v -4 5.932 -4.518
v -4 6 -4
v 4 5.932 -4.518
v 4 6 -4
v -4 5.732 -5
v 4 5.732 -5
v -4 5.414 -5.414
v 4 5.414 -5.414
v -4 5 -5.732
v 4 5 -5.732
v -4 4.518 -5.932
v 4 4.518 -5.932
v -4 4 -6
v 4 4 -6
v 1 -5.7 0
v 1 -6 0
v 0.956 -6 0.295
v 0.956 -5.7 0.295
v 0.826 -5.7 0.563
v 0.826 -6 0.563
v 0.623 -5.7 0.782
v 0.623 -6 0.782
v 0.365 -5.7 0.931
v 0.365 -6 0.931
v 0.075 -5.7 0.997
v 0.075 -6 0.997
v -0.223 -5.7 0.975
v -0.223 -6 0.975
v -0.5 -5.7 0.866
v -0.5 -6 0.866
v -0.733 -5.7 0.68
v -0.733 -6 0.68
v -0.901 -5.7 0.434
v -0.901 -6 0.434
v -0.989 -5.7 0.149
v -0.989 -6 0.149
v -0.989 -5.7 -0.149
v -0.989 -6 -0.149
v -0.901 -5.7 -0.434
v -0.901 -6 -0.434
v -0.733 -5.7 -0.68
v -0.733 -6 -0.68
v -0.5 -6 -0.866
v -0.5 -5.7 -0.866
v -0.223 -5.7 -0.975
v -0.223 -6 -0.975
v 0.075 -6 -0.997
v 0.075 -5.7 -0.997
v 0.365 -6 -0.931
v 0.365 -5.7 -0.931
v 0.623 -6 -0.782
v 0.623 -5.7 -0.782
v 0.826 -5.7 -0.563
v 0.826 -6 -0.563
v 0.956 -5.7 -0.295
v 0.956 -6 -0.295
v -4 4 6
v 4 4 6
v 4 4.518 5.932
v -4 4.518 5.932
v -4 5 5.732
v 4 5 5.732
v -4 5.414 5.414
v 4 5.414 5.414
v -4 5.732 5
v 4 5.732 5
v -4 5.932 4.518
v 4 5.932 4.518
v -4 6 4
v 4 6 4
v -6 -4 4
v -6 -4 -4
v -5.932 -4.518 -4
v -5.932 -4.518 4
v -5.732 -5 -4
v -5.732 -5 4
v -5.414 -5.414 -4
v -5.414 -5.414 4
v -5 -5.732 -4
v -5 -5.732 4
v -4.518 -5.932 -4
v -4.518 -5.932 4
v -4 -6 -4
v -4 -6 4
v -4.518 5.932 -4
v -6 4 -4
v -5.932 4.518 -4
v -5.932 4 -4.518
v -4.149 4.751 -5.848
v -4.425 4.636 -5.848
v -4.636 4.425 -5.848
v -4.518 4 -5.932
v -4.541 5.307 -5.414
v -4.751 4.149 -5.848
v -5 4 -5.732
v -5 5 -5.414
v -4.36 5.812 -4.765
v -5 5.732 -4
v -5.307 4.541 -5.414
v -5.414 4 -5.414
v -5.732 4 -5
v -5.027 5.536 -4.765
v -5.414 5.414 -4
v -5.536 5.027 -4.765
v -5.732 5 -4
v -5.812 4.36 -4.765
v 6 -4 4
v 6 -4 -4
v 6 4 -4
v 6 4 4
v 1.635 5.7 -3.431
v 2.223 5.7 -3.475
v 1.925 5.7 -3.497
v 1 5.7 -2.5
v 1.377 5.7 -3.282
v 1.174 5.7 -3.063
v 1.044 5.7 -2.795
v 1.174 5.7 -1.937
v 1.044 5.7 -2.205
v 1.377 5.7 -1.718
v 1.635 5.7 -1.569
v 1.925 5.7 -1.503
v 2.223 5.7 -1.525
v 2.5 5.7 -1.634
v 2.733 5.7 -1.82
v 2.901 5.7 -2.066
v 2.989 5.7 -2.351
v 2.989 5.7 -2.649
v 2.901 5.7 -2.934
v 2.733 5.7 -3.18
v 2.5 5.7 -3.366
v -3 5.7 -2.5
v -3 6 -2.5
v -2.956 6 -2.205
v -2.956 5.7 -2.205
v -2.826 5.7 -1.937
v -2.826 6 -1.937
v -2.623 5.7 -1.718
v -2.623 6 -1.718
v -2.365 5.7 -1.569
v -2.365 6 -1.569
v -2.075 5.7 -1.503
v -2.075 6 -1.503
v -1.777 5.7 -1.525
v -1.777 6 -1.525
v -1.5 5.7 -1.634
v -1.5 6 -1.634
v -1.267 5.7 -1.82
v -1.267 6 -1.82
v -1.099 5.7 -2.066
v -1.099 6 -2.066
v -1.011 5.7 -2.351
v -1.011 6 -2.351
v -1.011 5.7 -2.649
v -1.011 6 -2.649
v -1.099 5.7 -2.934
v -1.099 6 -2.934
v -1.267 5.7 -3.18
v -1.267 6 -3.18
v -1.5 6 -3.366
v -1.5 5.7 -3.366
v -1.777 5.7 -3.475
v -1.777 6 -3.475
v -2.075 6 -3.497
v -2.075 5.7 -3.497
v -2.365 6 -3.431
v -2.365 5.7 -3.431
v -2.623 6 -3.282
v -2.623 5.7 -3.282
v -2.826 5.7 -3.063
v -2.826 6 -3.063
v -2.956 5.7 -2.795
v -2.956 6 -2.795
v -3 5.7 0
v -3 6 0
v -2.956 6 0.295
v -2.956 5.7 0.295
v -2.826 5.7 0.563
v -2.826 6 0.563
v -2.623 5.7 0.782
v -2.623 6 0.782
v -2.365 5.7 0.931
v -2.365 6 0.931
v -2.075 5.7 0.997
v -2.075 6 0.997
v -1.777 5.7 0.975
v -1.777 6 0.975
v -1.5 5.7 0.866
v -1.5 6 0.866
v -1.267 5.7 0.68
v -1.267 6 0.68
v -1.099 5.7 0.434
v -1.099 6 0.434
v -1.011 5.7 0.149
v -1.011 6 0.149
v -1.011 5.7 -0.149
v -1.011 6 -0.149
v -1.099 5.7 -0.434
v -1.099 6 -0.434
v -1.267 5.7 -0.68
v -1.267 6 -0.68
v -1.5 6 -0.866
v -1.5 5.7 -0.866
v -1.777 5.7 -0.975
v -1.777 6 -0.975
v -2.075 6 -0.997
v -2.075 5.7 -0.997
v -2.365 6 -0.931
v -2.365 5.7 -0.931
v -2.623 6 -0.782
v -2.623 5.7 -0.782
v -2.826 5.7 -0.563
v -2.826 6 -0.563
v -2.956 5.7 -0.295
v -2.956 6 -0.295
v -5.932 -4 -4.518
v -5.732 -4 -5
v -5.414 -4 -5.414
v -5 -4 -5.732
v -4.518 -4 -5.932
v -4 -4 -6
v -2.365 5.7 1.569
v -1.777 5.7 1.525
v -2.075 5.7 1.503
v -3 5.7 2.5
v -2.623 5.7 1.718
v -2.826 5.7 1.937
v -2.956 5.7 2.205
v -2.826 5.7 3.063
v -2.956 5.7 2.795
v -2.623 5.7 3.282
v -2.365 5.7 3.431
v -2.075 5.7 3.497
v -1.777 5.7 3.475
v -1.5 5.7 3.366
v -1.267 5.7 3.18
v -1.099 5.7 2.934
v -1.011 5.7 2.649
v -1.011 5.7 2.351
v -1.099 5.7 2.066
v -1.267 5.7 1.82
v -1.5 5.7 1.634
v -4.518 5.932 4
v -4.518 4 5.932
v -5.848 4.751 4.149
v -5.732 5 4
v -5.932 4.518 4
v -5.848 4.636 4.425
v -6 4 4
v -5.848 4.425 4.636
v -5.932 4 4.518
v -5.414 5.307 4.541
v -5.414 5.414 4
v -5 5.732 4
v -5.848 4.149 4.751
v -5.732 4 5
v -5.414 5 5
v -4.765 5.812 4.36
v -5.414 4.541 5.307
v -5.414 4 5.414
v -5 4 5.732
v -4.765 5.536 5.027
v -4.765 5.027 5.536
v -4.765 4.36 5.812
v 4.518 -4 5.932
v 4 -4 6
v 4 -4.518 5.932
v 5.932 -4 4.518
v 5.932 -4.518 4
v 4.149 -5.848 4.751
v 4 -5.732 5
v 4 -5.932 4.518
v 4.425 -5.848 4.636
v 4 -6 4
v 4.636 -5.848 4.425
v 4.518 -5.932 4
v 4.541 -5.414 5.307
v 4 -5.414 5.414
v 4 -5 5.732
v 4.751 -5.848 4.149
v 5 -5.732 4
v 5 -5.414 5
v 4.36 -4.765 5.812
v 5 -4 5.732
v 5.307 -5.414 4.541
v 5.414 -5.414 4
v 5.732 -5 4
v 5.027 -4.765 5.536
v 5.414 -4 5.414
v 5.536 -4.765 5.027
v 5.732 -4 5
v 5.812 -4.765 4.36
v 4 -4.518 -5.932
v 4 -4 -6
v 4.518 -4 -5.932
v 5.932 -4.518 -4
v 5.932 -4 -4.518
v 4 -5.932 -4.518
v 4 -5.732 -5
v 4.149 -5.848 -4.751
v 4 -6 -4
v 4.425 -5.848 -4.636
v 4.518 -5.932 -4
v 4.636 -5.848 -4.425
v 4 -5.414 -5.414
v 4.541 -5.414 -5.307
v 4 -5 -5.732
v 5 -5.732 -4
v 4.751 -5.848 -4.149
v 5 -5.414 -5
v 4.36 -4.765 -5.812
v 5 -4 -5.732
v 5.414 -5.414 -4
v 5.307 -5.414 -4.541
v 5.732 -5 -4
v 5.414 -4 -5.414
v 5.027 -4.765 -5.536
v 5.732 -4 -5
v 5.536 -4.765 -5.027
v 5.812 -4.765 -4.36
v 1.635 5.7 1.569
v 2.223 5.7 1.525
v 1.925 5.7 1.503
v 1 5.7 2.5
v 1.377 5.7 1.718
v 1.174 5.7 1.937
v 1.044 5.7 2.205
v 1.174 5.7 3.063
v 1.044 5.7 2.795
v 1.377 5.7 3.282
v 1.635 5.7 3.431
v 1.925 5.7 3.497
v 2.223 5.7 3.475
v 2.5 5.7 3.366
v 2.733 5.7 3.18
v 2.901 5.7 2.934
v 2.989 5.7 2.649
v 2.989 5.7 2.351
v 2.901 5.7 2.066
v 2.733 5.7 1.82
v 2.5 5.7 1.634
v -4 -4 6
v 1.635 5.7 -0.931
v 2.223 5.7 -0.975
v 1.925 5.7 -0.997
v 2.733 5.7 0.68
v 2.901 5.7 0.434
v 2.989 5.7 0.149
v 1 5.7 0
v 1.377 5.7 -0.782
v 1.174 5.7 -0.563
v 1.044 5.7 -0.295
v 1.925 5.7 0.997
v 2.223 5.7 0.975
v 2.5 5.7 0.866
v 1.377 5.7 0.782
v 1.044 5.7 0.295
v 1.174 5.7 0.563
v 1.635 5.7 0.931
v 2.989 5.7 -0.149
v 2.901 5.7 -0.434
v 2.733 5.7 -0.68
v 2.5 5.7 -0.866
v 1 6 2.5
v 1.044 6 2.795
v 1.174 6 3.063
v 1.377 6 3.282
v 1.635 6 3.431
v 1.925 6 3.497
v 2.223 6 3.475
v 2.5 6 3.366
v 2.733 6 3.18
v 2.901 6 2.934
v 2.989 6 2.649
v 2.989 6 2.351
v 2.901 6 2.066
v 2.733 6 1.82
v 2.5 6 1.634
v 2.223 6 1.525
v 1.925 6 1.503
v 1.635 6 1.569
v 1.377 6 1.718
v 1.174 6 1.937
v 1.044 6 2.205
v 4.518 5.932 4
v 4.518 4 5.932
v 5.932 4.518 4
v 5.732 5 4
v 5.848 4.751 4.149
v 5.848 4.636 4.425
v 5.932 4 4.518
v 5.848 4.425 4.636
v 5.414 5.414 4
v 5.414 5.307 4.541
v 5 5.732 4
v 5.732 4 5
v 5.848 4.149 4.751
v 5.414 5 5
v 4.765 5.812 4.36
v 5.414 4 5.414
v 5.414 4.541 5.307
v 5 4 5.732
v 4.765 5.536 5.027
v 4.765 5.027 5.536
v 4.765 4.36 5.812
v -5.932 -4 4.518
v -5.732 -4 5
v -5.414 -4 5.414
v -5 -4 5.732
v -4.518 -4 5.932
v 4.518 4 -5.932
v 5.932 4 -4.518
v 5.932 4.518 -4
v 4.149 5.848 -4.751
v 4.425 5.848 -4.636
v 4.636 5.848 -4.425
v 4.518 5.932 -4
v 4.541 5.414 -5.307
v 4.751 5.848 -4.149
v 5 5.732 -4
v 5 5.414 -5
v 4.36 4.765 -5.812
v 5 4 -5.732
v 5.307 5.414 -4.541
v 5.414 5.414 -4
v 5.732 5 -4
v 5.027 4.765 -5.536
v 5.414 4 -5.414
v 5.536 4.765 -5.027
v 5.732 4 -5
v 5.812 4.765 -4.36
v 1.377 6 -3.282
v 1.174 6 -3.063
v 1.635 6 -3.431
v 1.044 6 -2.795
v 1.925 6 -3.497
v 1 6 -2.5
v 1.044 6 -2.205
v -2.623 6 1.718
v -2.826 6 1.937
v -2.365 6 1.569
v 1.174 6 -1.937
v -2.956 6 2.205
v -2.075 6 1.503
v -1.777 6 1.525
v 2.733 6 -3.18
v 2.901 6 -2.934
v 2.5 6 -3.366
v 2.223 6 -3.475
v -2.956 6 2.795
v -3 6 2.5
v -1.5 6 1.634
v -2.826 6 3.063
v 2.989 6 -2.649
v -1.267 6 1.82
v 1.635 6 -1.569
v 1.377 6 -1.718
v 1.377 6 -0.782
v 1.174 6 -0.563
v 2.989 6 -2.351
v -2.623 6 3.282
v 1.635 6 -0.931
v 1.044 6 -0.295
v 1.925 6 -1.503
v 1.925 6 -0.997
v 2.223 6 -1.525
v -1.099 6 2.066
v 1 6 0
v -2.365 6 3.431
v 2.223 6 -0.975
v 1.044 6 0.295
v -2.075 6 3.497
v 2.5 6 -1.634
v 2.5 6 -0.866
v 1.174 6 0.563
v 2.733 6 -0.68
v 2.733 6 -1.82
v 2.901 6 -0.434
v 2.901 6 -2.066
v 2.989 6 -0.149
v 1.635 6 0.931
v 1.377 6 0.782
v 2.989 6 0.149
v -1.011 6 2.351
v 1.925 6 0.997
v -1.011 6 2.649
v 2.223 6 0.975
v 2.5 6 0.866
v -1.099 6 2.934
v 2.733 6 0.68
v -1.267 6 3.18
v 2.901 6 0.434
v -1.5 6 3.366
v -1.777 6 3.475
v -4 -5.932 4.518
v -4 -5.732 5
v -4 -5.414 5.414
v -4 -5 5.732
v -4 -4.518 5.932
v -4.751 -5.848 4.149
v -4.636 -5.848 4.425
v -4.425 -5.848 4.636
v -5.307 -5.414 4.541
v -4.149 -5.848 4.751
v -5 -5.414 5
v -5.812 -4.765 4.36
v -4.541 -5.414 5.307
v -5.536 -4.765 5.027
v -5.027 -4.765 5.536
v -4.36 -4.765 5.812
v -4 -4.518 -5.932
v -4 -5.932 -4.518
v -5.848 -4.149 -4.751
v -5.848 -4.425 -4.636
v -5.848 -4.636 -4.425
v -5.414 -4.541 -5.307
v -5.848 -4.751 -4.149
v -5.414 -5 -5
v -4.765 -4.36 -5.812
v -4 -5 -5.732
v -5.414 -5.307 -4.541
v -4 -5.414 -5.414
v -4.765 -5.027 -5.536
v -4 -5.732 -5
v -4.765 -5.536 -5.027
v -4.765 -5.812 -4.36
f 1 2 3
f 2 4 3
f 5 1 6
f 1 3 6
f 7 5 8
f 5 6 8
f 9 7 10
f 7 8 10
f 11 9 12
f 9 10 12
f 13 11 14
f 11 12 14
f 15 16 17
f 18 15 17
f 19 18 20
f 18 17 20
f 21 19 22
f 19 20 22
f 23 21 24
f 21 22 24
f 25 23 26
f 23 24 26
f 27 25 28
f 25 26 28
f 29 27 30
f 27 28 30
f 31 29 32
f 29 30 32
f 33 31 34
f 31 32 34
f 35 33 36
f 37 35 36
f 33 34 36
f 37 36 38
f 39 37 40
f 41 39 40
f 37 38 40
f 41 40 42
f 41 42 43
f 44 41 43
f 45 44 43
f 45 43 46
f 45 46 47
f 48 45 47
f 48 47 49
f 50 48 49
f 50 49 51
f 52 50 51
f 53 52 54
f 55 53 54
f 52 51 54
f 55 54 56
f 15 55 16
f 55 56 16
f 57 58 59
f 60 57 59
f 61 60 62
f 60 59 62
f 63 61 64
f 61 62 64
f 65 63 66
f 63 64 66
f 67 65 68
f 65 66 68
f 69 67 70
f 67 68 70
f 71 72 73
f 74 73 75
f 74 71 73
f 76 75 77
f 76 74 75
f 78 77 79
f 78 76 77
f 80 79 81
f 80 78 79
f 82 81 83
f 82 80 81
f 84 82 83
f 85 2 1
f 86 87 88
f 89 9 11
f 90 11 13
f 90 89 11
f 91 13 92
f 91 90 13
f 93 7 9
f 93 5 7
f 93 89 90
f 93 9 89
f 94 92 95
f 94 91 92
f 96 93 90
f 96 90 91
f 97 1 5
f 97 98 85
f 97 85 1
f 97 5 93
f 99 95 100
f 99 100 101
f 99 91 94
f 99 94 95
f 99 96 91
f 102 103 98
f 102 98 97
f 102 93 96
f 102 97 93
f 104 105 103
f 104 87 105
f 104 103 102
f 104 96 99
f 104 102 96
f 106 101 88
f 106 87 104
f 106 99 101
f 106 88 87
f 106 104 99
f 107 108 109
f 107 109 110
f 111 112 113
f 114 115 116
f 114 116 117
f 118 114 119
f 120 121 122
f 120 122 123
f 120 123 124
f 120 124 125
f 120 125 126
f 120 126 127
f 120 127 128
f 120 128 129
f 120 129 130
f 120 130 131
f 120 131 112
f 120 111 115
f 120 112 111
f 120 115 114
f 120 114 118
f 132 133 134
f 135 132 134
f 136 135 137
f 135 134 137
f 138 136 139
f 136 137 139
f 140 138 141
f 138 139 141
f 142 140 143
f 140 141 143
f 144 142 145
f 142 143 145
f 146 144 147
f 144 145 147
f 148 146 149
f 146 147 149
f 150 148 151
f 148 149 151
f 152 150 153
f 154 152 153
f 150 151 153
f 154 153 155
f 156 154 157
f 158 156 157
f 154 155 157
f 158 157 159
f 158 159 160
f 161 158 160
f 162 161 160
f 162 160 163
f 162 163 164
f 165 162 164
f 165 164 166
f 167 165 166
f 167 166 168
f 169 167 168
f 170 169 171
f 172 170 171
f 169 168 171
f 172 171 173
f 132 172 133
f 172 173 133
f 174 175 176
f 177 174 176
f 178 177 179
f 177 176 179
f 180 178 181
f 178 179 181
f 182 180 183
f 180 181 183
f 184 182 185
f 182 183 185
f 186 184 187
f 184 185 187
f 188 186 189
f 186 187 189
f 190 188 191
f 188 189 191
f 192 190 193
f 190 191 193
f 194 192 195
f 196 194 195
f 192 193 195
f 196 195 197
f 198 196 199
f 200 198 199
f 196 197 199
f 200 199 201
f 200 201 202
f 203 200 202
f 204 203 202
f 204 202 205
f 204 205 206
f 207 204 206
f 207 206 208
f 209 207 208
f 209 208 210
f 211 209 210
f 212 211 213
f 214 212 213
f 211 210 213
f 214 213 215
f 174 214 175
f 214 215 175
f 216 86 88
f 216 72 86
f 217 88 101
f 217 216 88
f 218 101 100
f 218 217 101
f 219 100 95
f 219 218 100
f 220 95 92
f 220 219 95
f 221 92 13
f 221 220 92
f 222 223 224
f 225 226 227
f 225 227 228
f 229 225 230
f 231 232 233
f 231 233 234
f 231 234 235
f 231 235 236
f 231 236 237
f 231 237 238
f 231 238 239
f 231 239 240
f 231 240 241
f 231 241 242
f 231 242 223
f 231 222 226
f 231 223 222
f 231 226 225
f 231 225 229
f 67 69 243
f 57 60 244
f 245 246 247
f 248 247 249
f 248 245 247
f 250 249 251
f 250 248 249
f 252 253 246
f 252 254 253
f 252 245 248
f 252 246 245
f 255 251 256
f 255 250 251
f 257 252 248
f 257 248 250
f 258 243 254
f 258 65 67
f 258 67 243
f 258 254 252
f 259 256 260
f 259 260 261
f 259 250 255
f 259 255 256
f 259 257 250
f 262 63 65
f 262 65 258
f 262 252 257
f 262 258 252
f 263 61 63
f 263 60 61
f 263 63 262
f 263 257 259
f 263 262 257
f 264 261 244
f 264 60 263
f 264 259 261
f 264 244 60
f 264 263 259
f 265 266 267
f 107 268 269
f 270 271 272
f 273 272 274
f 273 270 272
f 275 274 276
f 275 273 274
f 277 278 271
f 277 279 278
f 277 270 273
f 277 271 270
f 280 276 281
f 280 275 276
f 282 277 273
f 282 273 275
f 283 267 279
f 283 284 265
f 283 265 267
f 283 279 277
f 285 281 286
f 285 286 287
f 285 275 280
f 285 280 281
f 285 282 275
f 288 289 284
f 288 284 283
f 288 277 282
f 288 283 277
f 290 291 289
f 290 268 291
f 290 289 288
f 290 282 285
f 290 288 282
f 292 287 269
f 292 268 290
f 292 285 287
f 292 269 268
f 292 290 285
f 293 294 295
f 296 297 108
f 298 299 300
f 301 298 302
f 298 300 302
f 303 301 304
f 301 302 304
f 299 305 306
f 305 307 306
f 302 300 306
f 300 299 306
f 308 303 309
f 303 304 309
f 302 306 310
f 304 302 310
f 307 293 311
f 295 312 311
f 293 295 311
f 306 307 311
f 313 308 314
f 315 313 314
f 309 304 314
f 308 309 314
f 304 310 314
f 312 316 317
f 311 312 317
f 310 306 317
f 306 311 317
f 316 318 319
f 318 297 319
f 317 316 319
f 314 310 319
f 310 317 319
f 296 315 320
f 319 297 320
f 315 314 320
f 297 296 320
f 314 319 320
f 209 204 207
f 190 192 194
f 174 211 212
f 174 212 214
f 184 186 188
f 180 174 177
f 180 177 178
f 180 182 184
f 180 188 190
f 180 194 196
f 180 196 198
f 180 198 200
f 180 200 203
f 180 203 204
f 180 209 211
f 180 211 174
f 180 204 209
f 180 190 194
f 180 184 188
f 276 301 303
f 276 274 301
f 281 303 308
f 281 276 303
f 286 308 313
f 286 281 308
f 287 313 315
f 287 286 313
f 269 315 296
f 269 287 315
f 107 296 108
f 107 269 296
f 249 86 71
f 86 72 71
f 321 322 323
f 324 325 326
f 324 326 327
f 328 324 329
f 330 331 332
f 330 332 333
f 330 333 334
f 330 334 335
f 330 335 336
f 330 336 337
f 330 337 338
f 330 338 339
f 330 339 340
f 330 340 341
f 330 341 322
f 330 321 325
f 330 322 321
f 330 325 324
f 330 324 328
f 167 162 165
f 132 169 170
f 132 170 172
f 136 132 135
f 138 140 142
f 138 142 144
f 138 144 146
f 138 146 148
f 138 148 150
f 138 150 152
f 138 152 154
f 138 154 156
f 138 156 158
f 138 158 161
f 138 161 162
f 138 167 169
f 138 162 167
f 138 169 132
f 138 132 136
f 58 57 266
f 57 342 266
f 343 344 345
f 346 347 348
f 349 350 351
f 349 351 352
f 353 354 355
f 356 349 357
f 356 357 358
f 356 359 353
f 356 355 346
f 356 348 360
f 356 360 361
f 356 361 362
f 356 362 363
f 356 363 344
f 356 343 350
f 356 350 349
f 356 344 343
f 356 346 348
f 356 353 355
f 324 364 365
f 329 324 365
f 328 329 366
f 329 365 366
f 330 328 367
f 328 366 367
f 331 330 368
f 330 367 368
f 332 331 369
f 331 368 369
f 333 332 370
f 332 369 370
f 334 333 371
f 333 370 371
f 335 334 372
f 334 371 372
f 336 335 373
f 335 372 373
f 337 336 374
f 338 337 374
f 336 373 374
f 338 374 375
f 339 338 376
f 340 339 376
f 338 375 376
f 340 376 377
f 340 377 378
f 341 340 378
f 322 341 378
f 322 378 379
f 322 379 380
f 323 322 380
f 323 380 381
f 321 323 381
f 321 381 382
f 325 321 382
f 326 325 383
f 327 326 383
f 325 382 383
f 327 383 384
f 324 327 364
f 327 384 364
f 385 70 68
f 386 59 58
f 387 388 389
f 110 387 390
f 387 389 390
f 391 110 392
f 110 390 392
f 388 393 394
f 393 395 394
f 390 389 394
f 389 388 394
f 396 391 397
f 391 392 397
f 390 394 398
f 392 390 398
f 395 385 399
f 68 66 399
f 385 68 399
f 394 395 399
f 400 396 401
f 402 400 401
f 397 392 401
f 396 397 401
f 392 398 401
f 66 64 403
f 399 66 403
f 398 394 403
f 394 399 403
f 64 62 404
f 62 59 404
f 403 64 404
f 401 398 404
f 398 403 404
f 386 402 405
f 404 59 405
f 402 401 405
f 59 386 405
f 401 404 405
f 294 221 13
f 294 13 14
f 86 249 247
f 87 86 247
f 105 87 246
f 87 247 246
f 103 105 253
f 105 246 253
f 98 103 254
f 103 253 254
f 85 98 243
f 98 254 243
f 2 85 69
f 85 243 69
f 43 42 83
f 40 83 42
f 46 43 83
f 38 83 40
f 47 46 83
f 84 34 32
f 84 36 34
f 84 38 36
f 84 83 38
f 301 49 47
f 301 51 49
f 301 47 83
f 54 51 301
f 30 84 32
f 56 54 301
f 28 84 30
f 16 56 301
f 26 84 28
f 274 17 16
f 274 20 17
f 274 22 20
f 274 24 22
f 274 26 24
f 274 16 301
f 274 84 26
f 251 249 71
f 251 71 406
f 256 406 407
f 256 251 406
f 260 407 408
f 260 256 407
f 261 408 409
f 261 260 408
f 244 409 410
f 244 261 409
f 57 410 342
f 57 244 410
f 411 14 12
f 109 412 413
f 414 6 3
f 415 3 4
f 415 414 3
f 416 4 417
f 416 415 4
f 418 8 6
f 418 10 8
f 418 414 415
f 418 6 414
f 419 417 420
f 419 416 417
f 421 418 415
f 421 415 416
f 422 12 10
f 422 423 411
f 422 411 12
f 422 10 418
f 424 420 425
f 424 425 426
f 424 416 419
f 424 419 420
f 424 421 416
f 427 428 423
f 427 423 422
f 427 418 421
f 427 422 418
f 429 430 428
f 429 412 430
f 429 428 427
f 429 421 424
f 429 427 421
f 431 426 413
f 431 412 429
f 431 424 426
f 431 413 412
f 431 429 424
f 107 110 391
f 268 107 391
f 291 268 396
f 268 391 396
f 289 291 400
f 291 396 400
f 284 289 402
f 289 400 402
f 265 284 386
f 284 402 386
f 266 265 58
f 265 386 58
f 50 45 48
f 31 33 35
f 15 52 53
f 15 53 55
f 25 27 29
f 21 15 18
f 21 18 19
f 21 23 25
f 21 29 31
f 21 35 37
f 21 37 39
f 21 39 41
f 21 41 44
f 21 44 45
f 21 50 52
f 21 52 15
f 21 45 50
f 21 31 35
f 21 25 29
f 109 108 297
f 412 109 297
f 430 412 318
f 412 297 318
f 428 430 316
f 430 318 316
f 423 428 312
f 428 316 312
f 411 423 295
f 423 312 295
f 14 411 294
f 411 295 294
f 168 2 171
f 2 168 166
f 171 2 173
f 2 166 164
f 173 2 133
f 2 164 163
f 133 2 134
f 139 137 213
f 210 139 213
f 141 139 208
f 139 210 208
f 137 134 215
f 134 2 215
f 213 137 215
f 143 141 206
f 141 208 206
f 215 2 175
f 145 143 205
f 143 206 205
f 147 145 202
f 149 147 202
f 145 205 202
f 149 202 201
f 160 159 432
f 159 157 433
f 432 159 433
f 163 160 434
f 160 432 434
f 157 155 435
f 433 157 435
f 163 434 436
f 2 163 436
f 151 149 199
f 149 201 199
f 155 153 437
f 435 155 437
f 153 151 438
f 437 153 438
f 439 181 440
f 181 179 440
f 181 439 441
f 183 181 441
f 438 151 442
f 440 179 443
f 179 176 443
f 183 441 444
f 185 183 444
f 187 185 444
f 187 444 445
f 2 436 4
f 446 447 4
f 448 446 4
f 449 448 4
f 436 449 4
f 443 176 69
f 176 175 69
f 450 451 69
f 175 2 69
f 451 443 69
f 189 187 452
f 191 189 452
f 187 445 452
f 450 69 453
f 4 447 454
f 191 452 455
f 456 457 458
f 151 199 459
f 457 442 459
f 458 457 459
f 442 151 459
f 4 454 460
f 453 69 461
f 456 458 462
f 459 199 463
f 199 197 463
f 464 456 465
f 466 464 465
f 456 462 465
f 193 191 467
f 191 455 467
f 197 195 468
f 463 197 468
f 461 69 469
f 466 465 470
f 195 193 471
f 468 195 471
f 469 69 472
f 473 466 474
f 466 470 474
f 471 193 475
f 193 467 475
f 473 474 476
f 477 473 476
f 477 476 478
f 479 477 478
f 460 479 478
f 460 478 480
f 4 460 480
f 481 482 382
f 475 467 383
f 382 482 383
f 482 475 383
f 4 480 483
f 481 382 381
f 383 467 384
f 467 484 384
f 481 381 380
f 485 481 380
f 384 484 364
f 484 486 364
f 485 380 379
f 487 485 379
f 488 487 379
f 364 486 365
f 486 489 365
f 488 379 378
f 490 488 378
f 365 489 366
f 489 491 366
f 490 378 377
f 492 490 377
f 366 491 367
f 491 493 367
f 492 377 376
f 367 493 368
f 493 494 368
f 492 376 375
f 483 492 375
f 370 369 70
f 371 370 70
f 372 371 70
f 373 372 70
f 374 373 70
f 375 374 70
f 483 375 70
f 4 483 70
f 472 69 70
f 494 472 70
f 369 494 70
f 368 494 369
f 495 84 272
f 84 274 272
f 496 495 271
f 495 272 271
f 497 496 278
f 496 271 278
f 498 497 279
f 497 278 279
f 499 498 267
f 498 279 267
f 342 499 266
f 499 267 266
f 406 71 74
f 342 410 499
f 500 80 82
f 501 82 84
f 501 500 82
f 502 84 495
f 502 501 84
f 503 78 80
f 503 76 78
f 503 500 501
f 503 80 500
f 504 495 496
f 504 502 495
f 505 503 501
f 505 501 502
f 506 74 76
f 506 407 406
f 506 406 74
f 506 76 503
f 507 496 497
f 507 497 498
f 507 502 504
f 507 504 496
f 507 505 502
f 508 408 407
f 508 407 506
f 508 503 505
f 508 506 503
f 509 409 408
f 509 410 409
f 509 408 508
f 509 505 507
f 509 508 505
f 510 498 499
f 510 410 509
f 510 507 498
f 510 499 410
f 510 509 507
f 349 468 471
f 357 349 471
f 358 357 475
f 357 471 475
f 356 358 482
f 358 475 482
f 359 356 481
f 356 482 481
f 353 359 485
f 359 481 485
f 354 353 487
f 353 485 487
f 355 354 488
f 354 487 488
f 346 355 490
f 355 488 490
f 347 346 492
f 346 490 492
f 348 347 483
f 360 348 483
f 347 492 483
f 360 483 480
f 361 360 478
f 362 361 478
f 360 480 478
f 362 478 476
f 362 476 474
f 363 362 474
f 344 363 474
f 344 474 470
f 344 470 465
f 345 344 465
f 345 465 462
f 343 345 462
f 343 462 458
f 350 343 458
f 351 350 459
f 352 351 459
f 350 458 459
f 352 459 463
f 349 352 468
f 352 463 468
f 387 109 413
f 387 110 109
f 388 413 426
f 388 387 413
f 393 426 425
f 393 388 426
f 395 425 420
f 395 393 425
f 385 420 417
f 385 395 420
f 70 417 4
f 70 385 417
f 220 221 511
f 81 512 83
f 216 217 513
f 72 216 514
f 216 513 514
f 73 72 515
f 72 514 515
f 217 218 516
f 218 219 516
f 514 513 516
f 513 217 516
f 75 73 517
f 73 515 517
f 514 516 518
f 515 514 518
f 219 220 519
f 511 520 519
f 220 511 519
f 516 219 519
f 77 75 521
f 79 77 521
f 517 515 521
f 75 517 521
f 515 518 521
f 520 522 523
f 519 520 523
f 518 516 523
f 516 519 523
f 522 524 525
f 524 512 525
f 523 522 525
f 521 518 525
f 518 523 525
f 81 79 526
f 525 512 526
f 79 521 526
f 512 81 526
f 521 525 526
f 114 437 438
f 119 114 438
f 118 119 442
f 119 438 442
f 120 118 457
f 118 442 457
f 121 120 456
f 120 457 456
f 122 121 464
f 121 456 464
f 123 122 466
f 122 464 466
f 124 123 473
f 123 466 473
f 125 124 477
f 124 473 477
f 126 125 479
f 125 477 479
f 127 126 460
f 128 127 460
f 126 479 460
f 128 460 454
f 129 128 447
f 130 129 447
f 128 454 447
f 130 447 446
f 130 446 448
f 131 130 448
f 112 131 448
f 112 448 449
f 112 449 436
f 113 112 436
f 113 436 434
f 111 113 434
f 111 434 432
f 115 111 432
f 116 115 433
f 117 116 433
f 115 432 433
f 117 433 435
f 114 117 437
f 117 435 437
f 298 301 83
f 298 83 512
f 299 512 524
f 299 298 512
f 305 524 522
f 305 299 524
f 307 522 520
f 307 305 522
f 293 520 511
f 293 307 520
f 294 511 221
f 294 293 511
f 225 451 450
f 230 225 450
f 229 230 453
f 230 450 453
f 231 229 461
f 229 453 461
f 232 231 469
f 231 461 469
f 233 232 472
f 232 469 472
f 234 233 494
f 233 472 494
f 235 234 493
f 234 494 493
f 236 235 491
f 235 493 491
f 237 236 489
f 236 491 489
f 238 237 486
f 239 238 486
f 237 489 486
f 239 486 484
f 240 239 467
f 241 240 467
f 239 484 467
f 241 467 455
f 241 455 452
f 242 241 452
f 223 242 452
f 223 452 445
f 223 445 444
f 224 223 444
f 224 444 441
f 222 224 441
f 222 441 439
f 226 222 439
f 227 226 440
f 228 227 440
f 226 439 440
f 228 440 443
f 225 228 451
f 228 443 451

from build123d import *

# Parameters (mm, degrees)
F0_W          = 12
F0_H          = 12
F1_DEPTH      = 6
F1_DEPTH_BACK = 6
F2_R          = 2
F3_R          = 1
F4_DEPTH      = 0.3
F5_R          = 1
F6_DEPTH      = 0.3


with BuildPart() as f1:
    # F0 (on Front) → F1 (new body, two sides)
    with BuildSketch(Plane.XZ) as f1_sk:
        Rectangle(F0_W, F0_H)
    extrude(amount=F1_DEPTH)
    extrude(f1_sk.sketch, amount=-F1_DEPTH_BACK)

    # F2
    f2_edges = [f1.edges().sort_by_distance(p)[0] for p in [
        (6, 0, -6),
        (0, 6, 6),
        (-6, 6, 0),
        (0, 6, -6),
        (6, 6, 0),
        (6, 0, 6),
        (-6, 0, 6),
        (0, -6, -6),
        (-6, 0, -6),
        (-6, -6, 0),
        (0, -6, 6),
        (6, -6, 0),
    ]]
    fillet(f2_edges, radius=F2_R)

    # F3 (on face) → F4 (cut)
    with BuildSketch(Plane.XZ.offset(6)):
        Circle(F3_R)
    extrude(amount=-F4_DEPTH, mode=Mode.SUBTRACT)

    # F5 (on face) → F6 (cut)
    with BuildSketch(Plane(origin=(0, 6, 0), x_dir=(-1, 0, 0), z_dir=(0, 1, 0))):
        with Locations((-2, 2.5)):
            Circle(F5_R)
        with Locations((2, 2.5)):
            Circle(F5_R)
        with Locations((2, 0)):
            Circle(F5_R)
        with Locations((2, -2.5)):
            Circle(F5_R)
        with Locations((-2, 0)):
            Circle(F5_R)
        with Locations((-2, -2.5)):
            Circle(F5_R)
    extrude(amount=-F6_DEPTH, mode=Mode.SUBTRACT)


solid = f1.part
